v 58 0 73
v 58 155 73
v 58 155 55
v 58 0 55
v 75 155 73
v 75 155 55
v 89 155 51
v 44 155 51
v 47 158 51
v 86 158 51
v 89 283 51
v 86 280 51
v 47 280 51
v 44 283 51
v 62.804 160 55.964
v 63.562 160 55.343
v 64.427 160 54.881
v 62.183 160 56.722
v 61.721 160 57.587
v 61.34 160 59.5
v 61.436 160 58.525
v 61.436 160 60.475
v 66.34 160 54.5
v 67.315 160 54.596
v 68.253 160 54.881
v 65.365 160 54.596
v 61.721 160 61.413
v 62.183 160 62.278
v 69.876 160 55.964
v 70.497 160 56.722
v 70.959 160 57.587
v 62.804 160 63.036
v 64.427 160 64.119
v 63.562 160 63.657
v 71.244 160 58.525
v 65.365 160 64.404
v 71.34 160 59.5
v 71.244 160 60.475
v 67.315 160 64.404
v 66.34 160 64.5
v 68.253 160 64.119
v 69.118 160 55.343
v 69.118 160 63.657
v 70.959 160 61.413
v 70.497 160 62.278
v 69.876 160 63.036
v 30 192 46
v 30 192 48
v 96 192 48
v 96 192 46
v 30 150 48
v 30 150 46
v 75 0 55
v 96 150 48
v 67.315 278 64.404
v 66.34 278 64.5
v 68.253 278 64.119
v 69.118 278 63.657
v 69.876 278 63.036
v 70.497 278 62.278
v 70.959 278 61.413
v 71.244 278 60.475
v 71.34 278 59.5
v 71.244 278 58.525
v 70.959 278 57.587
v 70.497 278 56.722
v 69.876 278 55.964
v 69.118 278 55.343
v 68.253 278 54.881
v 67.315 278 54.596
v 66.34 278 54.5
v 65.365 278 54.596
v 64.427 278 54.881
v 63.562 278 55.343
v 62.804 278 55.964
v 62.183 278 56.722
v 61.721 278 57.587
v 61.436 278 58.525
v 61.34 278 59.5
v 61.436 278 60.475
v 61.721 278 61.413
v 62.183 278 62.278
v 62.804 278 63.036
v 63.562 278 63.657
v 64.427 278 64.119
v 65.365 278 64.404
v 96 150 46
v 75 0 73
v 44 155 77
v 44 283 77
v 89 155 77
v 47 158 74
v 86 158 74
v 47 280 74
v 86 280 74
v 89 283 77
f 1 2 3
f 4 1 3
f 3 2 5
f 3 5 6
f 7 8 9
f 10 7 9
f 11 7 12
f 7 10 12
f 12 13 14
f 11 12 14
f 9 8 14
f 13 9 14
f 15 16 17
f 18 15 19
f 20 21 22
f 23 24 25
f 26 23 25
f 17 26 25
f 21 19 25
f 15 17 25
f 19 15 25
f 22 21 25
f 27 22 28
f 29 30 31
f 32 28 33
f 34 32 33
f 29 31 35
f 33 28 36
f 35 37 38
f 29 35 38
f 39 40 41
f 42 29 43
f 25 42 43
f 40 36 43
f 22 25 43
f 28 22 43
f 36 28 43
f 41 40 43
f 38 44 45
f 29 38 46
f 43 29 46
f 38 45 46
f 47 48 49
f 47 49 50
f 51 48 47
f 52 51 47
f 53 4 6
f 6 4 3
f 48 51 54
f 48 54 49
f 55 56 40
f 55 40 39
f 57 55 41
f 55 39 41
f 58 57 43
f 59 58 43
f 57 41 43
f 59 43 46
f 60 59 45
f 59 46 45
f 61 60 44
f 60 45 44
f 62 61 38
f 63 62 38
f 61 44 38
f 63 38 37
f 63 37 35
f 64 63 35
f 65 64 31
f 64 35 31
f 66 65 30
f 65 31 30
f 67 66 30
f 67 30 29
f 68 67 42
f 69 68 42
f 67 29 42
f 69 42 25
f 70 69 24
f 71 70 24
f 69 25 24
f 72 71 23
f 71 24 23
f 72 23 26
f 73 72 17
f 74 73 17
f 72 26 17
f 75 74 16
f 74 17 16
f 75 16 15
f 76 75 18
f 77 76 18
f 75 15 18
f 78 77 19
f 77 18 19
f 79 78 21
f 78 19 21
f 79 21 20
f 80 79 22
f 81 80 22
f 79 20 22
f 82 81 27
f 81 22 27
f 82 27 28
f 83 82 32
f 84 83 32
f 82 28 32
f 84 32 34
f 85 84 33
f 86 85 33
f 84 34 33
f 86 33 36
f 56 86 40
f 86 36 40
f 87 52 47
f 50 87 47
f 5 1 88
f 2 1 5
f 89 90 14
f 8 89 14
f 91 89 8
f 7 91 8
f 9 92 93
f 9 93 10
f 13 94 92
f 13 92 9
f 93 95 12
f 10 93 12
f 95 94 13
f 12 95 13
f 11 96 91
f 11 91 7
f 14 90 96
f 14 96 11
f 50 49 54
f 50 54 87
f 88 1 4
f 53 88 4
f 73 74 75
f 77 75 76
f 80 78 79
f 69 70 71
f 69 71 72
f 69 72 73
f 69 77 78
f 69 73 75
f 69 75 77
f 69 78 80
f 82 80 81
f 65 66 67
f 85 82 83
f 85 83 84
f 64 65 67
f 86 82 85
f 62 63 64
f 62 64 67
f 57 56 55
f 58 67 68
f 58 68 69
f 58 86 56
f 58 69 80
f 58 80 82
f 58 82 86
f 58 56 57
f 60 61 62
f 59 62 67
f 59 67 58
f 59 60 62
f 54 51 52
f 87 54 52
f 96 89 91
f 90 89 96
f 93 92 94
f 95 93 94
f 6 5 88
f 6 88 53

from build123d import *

# Parameters (mm, degrees)
REFLECTOR_START     = 44
SKETCH1_W           = 26
SKETCH1_H           = 128
REFLECTOR_DEPTH     = 45
CAVITY_START        = 47
SKETCH2_W           = 29
SKETCH2_H           = 122
CAVITY_DEPTH        = 39
R7S_LAMP_START      = 160
SKETCH3_R           = 5
R7S_LAMP_DEPTH      = 118
HEATER_COLUMN_START = 58
SKETCH4_W           = 18
SKETCH4_H           = 155
HEATER_COLUMN_DEPTH = 17
HEAT_SHIELD_START   = 30
SKETCH5_W           = 2
SKETCH5_H           = 42
HEAT_SHIELD_DEPTH   = 66


with BuildPart() as part:
    # Sketch1 → reflector (new body)
    with BuildSketch(Plane(origin=(0, 0, 0), x_dir=(0, 0, -1), z_dir=(1, 0, 0)).offset(REFLECTOR_START)):
        with Locations((-64, 219)):
            Rectangle(SKETCH1_W, SKETCH1_H)
    extrude(amount=REFLECTOR_DEPTH)


with BuildPart() as body_2:
    # Sketch2 → cavity (new body)
    with BuildSketch(Plane(origin=(0, 0, 0), x_dir=(0, 0, -1), z_dir=(1, 0, 0)).offset(CAVITY_START)):
        with Locations((-59.5, 219)):
            Rectangle(SKETCH2_W, SKETCH2_H)
    extrude(amount=CAVITY_DEPTH)


with BuildPart() as part_1:
    add(part.part)

    # Combine1: cut body 2
    add(body_2.part, mode=Mode.SUBTRACT)


with BuildPart() as body_2_2:
    # Sketch3 → r7s_lamp (new body)
    with BuildSketch(Plane(origin=(0, 0, 0), x_dir=(1, 0, 0), z_dir=(0, 1, 0)).offset(R7S_LAMP_START)):
        with Locations((66.34, -59.5)):
            Circle(SKETCH3_R)
    extrude(amount=R7S_LAMP_DEPTH)


with BuildPart() as body_3:
    # Sketch4 → heater_column (new body)
    with BuildSketch(Plane(origin=(0, 0, 0), x_dir=(0, 0, -1), z_dir=(1, 0, 0)).offset(HEATER_COLUMN_START)):
        with Locations((-64, 77.5)):
            Rectangle(SKETCH4_W, SKETCH4_H)
    extrude(amount=HEATER_COLUMN_DEPTH)


with BuildPart() as body_4:
    # Sketch5 → heat_shield (new body)
    with BuildSketch(Plane(origin=(0, 0, 0), x_dir=(0, 0, -1), z_dir=(1, 0, 0)).offset(HEAT_SHIELD_START)):
        with Locations((-47, 171)):
            Rectangle(SKETCH5_W, SKETCH5_H)
    extrude(amount=HEAT_SHIELD_DEPTH)


solid = Compound([part_1.part, body_2_2.part, body_3.part, body_4.part])
